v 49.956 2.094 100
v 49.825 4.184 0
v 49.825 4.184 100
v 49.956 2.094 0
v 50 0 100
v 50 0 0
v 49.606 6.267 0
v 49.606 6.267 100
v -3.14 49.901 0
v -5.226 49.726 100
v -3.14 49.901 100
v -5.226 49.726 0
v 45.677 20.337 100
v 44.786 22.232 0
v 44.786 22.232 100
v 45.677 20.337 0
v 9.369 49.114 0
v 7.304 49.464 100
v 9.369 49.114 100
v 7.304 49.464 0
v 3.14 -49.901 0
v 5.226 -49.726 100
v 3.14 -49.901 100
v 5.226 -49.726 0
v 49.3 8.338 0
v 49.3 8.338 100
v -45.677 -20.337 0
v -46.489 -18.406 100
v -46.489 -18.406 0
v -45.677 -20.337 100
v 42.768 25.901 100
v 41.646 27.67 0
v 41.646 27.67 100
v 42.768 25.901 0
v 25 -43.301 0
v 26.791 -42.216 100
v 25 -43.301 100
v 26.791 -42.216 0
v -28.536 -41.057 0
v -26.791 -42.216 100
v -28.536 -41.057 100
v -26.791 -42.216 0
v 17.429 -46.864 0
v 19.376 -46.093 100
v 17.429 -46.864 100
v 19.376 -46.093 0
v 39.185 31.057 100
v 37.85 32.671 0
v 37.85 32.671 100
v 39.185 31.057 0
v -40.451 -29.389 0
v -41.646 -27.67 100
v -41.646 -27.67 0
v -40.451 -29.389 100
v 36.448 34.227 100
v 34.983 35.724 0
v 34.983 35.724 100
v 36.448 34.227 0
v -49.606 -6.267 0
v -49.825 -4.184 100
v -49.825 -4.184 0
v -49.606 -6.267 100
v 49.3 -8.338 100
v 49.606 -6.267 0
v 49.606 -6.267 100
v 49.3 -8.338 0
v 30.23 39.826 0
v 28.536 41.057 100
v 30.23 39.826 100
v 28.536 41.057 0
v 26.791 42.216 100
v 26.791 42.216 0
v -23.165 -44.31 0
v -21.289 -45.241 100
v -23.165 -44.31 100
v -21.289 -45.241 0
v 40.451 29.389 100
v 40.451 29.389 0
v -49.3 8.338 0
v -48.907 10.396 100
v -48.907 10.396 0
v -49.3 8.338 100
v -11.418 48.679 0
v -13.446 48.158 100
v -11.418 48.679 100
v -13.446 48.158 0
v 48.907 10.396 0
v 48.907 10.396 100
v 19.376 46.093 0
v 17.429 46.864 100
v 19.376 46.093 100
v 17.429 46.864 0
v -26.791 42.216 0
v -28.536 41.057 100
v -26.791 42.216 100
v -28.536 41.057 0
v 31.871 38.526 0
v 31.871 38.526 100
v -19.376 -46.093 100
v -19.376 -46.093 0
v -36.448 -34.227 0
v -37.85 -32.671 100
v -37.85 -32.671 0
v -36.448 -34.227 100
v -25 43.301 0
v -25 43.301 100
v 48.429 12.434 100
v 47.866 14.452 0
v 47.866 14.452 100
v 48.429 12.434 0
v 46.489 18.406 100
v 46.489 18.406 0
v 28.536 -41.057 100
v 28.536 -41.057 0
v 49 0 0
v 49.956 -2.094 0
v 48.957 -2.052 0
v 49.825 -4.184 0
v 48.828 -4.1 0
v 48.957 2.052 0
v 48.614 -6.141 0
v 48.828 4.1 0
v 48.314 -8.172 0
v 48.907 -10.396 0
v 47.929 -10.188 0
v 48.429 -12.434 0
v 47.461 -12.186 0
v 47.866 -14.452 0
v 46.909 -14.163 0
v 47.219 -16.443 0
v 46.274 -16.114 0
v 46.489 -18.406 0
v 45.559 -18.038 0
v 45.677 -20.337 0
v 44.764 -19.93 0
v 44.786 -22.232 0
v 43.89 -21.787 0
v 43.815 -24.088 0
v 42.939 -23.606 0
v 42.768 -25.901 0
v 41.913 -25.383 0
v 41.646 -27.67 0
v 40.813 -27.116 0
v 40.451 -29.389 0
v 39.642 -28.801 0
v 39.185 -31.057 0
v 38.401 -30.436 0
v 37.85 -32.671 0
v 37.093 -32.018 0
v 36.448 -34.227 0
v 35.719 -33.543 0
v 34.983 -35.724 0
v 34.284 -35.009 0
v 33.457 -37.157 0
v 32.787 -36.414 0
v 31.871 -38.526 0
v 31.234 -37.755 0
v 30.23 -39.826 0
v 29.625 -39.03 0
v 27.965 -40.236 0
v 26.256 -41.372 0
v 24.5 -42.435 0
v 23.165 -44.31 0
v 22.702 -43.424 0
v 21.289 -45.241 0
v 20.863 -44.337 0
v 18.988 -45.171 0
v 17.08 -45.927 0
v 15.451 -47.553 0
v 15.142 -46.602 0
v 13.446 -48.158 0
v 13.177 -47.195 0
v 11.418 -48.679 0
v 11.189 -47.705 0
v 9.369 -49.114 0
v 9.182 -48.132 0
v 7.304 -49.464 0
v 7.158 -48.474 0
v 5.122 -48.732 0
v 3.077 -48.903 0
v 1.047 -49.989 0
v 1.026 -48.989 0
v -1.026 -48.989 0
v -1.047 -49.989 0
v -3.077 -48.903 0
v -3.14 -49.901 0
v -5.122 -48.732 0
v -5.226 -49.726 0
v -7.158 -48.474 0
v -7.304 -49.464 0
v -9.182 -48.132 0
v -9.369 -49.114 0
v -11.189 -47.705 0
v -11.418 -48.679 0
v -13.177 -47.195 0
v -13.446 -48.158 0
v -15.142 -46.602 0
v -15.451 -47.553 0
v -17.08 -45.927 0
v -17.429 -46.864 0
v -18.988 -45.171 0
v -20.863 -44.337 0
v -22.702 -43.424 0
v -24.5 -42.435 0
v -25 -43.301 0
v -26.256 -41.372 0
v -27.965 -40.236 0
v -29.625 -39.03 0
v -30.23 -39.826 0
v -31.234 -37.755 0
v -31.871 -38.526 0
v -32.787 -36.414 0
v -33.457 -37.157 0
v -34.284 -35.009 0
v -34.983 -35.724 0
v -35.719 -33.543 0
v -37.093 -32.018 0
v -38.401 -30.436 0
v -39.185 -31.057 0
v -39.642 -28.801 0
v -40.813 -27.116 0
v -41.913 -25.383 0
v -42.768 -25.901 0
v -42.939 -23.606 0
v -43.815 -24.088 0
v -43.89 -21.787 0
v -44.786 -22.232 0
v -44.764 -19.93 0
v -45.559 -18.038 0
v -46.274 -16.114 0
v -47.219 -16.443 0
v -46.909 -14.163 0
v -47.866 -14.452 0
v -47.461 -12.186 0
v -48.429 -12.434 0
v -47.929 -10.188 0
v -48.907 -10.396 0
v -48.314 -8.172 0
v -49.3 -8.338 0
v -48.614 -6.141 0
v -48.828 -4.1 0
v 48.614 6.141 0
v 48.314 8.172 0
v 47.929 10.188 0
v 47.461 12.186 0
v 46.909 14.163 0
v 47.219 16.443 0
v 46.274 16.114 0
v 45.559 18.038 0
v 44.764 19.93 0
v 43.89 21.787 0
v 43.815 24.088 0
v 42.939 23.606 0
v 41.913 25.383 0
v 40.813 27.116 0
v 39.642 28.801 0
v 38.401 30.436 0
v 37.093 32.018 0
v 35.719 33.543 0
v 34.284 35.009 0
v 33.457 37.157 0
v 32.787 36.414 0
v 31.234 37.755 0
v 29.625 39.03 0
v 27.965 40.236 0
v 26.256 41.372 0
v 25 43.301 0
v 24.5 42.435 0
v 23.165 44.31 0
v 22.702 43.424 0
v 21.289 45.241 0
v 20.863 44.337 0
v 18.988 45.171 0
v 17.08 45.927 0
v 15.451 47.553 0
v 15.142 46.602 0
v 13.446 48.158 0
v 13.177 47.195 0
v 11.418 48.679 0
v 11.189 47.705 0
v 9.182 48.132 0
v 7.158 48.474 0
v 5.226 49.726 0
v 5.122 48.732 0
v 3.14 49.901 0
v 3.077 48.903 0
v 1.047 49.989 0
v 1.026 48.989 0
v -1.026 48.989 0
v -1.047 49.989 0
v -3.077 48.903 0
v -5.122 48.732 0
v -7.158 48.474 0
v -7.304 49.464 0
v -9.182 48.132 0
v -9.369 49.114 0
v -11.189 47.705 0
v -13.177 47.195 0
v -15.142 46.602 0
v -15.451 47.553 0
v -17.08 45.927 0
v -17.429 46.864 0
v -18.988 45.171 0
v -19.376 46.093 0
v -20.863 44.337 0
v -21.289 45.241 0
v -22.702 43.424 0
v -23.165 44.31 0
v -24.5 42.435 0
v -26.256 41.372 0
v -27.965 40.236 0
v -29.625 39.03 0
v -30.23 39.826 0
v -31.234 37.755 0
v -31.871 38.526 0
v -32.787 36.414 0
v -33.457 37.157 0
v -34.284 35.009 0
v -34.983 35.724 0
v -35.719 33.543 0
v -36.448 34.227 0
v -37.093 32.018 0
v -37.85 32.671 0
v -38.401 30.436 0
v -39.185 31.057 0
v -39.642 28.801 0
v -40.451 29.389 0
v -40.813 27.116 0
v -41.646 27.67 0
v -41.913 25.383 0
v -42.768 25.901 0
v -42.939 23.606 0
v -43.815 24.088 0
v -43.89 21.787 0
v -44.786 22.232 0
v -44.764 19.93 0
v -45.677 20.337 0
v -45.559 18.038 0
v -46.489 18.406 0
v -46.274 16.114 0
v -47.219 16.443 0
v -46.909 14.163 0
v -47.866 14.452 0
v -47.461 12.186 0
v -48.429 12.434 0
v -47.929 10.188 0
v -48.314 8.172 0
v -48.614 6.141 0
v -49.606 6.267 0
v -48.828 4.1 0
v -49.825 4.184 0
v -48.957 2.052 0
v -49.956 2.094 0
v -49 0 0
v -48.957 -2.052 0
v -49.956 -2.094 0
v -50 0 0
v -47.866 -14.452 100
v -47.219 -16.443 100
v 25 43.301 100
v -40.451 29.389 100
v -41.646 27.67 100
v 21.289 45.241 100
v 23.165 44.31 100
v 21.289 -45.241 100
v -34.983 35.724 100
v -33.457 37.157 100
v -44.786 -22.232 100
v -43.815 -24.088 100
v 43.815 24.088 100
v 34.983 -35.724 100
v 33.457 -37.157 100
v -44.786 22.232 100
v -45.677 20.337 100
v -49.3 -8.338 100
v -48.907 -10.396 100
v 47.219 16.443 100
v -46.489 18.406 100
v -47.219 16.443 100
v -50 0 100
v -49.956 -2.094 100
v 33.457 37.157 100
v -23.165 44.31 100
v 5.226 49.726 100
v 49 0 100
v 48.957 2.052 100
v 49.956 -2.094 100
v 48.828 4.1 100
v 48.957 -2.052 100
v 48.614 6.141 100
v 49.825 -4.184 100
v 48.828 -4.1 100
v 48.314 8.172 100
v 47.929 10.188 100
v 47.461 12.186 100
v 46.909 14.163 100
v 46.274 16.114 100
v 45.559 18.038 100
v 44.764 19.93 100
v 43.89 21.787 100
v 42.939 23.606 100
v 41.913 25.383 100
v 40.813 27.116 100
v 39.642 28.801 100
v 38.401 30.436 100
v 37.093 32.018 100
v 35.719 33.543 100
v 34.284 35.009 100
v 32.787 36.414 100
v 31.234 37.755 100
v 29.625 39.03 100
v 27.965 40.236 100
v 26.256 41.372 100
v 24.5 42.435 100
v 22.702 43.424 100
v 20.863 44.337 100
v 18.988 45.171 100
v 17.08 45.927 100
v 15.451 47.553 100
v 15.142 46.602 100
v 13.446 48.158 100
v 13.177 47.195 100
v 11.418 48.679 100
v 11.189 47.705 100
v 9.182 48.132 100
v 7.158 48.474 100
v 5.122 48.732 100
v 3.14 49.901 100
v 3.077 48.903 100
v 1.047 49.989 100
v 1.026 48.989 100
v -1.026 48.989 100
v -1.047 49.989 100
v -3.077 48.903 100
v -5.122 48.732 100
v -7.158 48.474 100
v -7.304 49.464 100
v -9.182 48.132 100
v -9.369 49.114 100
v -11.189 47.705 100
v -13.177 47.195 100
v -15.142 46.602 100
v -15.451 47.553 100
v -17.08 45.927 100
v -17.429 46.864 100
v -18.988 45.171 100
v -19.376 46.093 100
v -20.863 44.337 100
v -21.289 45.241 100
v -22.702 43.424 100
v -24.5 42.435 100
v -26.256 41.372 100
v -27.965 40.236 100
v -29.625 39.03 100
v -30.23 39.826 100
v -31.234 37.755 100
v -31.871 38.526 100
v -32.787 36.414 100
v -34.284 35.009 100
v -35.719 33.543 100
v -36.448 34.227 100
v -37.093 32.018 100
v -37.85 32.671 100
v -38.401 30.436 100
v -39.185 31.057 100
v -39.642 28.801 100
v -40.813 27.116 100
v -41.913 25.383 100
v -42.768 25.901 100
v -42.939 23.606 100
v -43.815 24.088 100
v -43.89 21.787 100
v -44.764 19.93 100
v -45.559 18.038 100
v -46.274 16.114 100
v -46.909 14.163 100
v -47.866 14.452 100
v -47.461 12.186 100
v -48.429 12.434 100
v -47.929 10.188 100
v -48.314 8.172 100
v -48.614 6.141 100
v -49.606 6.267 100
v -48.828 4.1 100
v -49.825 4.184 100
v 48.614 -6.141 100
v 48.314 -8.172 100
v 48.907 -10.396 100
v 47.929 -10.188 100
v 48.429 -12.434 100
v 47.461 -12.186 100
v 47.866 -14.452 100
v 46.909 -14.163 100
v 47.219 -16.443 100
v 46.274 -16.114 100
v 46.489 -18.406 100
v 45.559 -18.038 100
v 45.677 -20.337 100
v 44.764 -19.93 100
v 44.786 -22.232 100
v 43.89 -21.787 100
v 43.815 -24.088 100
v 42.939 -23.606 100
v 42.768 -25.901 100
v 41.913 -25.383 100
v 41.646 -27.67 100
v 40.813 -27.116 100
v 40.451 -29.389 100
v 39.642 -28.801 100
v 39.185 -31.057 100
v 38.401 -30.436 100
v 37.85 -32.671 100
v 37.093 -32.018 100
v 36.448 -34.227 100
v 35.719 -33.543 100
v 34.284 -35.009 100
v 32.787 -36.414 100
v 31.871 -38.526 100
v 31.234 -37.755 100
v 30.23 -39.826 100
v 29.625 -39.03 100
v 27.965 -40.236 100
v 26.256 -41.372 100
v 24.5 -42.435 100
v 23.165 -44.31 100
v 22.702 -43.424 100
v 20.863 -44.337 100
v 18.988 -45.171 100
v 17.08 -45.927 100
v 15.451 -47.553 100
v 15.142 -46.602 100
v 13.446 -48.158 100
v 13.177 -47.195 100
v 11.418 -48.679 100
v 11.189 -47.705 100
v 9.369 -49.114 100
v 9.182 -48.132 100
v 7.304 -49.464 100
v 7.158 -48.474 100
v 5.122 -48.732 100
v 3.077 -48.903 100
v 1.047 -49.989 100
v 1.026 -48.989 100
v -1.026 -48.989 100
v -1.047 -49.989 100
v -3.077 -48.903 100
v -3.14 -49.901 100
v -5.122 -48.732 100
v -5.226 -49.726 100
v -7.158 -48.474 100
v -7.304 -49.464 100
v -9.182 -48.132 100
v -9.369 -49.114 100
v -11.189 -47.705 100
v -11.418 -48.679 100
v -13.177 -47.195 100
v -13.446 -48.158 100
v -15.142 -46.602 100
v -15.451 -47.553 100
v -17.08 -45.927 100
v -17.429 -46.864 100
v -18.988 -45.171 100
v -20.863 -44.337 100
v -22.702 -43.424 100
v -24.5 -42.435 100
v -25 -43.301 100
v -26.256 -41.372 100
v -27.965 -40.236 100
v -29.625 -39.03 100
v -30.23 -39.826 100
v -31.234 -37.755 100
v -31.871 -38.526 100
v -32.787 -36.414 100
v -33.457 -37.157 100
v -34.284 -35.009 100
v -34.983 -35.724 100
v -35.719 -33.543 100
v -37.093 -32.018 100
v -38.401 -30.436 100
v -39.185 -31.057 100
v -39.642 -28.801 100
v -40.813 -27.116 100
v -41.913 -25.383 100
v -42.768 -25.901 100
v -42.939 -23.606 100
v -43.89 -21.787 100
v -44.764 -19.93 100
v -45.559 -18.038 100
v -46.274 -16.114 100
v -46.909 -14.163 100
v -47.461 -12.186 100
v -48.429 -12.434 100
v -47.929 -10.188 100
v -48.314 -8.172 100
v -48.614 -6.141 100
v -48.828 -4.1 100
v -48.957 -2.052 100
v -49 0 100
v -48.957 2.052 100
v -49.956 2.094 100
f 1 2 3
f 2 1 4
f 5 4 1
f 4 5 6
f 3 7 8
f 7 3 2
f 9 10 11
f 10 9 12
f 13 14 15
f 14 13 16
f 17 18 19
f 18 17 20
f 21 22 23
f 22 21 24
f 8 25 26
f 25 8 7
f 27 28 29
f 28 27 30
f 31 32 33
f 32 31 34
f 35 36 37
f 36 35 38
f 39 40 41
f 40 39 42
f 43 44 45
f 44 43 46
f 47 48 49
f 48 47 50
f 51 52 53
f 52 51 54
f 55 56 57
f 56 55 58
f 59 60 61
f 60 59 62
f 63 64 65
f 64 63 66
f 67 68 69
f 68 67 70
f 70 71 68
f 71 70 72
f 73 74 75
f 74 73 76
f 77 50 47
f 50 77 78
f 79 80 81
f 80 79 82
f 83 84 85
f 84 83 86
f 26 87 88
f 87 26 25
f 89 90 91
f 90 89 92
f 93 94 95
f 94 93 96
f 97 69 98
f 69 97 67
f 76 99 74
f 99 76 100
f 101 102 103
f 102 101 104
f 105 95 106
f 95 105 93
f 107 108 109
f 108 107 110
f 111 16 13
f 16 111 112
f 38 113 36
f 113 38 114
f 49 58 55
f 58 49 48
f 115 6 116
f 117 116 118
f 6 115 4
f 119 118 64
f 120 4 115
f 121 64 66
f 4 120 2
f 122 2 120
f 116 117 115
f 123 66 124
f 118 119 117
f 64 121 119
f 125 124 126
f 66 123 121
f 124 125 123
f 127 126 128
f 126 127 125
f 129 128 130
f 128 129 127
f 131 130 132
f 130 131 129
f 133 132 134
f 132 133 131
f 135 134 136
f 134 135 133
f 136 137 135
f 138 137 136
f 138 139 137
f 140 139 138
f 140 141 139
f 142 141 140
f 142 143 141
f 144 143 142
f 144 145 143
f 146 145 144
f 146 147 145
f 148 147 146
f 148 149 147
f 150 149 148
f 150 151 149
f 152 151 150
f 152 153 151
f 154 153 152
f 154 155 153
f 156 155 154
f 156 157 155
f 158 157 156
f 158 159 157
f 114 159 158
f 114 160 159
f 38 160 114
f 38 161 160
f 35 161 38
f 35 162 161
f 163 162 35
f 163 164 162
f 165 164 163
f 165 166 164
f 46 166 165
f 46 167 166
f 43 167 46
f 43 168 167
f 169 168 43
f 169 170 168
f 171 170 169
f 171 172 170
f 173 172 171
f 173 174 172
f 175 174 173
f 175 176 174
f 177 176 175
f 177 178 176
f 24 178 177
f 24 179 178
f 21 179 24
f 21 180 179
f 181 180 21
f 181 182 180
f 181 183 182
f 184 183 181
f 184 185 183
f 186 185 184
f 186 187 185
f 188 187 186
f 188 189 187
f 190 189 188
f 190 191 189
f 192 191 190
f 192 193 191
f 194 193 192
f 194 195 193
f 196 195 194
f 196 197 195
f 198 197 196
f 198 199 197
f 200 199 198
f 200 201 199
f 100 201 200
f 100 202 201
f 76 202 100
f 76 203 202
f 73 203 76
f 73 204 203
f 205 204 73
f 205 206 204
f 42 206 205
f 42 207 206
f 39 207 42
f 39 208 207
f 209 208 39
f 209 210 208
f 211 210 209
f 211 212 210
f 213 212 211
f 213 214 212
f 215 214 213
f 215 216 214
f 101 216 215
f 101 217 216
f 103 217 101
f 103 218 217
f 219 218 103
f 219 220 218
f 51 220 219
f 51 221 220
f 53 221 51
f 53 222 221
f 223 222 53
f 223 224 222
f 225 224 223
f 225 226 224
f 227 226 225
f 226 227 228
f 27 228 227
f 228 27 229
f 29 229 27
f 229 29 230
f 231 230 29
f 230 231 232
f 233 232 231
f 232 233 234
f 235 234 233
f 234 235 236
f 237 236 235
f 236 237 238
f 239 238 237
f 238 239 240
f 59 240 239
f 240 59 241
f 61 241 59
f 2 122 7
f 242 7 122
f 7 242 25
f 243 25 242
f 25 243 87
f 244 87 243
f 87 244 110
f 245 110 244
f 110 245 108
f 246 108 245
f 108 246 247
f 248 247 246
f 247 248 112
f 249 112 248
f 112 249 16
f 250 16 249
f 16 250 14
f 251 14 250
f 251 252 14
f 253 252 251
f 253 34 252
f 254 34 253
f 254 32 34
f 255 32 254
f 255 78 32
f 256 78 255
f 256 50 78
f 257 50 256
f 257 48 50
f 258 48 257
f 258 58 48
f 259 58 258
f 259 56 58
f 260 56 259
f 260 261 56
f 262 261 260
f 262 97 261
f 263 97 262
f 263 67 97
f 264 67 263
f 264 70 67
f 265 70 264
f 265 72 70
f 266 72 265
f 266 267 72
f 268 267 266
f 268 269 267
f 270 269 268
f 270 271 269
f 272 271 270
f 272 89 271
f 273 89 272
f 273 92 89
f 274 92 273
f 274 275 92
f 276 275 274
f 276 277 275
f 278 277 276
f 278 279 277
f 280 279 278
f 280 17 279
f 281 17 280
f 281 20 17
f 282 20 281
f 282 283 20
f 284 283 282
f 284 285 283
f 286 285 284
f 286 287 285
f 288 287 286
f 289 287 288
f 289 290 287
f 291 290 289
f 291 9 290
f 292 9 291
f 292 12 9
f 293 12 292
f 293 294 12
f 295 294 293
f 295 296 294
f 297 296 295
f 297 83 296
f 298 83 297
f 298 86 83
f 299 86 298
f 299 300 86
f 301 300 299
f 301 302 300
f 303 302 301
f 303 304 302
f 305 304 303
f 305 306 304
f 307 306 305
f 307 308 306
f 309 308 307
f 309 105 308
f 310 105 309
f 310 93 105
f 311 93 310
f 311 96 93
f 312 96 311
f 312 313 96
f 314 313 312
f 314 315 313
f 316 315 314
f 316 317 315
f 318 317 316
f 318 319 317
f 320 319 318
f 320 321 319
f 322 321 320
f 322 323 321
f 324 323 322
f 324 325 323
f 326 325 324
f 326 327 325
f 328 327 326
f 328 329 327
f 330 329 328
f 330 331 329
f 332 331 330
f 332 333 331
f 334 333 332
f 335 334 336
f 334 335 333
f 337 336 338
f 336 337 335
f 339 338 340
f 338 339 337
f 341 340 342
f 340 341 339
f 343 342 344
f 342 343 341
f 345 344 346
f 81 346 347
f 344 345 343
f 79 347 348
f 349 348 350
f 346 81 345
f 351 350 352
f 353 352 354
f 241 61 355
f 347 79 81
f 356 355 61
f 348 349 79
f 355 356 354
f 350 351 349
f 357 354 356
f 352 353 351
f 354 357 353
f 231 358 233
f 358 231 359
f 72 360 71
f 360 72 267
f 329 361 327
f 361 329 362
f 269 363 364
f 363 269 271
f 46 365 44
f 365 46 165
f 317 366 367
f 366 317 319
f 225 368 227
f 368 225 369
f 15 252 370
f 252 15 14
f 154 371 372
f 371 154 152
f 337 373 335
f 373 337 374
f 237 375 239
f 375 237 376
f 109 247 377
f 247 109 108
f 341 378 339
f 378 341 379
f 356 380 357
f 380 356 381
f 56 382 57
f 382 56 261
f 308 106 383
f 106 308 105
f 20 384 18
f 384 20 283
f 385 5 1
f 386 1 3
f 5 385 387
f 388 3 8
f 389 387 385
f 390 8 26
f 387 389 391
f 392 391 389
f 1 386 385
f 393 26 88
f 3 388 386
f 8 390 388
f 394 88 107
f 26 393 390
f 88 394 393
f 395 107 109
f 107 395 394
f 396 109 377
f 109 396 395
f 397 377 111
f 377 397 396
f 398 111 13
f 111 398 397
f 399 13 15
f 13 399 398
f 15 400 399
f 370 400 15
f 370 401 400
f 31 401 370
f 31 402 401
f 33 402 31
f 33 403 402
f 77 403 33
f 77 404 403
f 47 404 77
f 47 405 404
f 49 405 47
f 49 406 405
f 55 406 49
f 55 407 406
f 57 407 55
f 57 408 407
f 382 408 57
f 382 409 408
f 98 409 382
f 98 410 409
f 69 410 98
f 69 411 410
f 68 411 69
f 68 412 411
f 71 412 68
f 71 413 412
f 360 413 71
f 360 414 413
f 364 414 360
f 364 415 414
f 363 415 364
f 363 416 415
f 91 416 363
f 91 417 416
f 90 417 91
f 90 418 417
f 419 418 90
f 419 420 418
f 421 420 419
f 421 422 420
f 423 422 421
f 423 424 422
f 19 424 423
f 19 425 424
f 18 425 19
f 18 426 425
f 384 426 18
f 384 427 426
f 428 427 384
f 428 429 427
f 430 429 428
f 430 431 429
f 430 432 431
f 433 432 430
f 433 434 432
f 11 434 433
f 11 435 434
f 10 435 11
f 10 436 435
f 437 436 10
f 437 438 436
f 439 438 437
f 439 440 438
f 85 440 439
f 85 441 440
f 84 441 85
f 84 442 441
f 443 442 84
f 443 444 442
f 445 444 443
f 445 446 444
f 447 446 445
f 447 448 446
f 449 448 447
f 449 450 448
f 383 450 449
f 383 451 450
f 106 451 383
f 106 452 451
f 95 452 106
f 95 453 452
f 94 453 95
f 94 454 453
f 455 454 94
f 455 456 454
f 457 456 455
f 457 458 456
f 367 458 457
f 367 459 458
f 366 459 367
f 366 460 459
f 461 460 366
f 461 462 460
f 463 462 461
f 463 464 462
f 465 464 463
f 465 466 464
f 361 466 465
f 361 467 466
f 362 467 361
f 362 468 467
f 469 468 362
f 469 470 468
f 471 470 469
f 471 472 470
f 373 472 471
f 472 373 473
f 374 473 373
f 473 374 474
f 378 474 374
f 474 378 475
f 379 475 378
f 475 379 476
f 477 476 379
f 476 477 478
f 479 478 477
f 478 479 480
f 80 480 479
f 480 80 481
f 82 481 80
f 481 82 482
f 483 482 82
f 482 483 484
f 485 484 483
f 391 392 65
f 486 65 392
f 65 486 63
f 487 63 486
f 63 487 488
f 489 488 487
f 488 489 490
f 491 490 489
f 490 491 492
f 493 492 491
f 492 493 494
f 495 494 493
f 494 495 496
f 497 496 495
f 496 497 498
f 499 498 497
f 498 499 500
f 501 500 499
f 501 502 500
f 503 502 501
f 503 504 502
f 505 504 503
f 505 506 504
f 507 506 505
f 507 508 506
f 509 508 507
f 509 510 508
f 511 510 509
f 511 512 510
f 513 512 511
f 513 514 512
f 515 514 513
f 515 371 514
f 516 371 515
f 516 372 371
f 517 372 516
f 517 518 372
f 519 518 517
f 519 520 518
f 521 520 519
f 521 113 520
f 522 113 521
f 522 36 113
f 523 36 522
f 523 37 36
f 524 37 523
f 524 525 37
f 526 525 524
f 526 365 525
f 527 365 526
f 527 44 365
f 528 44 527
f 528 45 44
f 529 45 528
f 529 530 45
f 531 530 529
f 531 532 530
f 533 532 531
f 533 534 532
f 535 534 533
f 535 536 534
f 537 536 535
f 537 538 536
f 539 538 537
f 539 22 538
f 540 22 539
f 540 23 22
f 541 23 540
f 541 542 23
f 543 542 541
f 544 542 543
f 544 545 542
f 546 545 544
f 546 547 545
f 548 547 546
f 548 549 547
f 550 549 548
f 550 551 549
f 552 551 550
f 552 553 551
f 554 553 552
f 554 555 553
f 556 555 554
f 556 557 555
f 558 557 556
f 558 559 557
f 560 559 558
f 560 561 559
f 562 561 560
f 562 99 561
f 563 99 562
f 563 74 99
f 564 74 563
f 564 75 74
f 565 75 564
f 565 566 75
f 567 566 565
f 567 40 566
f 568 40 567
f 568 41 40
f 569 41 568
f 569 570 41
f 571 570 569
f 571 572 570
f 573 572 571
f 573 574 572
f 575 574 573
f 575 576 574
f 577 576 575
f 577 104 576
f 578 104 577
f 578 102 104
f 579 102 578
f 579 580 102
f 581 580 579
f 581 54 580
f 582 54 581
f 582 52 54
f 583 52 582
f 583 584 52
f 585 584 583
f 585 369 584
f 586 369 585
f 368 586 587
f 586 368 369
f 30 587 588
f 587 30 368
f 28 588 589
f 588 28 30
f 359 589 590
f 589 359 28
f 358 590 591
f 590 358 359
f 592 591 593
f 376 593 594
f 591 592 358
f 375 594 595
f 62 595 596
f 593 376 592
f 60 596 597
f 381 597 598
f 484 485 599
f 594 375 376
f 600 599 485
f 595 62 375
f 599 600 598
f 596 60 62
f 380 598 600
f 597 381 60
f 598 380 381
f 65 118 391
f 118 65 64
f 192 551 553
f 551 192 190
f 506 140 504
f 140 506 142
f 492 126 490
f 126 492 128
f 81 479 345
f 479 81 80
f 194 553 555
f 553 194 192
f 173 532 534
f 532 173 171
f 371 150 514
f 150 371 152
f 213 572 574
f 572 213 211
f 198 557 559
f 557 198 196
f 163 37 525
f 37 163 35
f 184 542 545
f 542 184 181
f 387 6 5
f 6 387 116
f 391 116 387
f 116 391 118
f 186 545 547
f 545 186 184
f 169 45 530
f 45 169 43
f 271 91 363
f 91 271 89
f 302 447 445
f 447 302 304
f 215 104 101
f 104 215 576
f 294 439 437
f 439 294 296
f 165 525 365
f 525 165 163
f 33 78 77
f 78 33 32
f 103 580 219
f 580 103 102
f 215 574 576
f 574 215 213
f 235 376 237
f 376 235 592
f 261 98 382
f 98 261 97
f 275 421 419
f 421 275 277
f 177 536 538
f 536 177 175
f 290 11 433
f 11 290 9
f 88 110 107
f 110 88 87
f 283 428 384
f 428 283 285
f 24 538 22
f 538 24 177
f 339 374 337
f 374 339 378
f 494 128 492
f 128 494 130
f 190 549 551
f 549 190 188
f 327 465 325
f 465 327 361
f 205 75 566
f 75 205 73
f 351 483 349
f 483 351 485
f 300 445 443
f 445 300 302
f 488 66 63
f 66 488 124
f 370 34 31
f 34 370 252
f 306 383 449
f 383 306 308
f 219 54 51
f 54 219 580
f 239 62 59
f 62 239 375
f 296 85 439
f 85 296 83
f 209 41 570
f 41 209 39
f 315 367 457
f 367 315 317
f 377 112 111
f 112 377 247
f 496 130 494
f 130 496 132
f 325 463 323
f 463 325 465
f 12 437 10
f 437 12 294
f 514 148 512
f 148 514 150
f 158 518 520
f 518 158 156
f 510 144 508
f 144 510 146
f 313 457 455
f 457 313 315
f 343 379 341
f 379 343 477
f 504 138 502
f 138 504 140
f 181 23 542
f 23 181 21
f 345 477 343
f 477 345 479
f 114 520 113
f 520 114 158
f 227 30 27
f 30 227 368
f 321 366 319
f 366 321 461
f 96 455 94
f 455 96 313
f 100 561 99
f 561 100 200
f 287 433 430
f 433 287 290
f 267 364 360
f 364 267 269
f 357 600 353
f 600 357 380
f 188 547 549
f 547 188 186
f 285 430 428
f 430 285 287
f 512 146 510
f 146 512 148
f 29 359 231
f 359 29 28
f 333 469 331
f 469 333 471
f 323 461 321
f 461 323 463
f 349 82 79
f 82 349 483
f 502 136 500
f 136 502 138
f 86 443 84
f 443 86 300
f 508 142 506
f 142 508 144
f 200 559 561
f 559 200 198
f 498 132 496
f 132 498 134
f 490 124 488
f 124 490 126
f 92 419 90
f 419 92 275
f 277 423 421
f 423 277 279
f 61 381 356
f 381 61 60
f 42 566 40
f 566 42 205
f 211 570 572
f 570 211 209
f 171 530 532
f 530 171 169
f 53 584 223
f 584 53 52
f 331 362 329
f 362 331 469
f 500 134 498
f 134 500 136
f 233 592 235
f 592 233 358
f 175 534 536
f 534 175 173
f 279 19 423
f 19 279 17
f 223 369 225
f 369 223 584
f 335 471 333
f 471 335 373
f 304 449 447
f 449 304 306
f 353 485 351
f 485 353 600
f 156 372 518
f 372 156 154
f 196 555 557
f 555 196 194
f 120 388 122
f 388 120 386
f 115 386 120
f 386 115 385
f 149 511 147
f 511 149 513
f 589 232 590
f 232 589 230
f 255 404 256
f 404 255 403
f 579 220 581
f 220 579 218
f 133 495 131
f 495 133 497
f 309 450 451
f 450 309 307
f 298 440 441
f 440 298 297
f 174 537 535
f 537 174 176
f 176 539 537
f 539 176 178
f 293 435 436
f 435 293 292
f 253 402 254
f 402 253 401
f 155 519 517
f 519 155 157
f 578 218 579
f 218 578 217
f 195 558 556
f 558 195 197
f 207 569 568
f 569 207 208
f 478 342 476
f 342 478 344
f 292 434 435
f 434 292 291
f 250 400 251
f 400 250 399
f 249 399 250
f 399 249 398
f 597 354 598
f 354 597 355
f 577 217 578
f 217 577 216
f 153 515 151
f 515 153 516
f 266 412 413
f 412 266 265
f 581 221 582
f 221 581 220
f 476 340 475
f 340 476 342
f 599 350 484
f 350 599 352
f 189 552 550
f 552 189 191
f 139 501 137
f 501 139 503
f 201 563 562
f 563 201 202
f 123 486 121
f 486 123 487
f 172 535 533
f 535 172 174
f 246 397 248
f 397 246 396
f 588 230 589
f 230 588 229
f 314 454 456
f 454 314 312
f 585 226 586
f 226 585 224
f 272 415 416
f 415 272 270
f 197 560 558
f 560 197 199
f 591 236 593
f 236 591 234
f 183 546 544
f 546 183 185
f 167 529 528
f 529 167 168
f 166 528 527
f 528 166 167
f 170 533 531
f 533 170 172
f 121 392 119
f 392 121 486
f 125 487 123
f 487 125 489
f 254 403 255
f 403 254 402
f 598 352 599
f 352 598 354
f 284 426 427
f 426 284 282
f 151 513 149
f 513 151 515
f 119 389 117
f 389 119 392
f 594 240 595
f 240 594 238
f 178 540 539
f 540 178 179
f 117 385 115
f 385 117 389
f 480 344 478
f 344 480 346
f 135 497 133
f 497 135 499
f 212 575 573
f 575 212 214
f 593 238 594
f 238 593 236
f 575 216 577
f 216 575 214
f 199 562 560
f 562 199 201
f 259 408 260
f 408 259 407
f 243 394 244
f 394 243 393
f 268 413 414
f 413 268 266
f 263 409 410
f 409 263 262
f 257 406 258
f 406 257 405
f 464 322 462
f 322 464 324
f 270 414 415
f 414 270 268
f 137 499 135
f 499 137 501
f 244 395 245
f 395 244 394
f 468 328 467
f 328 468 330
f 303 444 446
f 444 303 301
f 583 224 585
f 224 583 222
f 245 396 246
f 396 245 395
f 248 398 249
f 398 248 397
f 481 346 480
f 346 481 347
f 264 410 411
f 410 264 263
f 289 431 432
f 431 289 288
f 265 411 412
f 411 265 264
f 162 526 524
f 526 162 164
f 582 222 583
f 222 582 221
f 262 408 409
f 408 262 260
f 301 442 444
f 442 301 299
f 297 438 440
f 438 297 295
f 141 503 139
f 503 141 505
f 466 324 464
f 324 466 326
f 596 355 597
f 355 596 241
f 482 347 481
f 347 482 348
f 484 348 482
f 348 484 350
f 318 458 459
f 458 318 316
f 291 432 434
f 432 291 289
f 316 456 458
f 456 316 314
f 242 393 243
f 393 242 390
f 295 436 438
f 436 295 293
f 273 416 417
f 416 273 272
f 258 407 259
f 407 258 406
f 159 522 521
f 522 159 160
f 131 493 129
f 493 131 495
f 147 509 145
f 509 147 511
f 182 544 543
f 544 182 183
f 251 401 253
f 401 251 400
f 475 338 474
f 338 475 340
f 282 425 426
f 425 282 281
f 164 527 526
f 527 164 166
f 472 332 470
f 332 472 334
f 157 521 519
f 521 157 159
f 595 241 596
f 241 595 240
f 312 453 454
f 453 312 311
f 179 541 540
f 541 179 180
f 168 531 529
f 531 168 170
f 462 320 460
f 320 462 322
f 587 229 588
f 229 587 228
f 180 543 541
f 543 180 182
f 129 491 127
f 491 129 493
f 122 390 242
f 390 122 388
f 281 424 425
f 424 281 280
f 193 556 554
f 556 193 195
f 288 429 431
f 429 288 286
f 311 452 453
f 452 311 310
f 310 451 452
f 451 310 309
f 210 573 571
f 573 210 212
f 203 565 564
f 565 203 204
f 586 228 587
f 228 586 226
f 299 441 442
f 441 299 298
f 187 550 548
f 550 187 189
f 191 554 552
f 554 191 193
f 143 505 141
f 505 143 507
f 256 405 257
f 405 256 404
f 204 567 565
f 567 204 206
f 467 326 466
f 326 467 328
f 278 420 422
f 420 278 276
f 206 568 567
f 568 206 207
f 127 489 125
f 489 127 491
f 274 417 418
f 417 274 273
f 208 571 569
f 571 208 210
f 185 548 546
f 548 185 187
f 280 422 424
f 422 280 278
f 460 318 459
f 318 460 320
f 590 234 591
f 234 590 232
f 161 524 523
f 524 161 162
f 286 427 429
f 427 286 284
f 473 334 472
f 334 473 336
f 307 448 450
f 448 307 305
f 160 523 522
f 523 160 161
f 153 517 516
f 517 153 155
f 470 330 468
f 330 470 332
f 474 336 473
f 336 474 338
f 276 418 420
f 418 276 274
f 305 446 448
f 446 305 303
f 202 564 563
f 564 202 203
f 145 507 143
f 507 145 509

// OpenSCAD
// Work in progress

$fn=150;
length = 250;
thickness = 1.5;
height = 200;


module duct_tube(h=100, d=100) {
    difference() {
        cylinder(h=h, d=d);
        translate([0,0,-1])
            cylinder(h=h+2, d=d-2);
    }
}

duct_tube();
